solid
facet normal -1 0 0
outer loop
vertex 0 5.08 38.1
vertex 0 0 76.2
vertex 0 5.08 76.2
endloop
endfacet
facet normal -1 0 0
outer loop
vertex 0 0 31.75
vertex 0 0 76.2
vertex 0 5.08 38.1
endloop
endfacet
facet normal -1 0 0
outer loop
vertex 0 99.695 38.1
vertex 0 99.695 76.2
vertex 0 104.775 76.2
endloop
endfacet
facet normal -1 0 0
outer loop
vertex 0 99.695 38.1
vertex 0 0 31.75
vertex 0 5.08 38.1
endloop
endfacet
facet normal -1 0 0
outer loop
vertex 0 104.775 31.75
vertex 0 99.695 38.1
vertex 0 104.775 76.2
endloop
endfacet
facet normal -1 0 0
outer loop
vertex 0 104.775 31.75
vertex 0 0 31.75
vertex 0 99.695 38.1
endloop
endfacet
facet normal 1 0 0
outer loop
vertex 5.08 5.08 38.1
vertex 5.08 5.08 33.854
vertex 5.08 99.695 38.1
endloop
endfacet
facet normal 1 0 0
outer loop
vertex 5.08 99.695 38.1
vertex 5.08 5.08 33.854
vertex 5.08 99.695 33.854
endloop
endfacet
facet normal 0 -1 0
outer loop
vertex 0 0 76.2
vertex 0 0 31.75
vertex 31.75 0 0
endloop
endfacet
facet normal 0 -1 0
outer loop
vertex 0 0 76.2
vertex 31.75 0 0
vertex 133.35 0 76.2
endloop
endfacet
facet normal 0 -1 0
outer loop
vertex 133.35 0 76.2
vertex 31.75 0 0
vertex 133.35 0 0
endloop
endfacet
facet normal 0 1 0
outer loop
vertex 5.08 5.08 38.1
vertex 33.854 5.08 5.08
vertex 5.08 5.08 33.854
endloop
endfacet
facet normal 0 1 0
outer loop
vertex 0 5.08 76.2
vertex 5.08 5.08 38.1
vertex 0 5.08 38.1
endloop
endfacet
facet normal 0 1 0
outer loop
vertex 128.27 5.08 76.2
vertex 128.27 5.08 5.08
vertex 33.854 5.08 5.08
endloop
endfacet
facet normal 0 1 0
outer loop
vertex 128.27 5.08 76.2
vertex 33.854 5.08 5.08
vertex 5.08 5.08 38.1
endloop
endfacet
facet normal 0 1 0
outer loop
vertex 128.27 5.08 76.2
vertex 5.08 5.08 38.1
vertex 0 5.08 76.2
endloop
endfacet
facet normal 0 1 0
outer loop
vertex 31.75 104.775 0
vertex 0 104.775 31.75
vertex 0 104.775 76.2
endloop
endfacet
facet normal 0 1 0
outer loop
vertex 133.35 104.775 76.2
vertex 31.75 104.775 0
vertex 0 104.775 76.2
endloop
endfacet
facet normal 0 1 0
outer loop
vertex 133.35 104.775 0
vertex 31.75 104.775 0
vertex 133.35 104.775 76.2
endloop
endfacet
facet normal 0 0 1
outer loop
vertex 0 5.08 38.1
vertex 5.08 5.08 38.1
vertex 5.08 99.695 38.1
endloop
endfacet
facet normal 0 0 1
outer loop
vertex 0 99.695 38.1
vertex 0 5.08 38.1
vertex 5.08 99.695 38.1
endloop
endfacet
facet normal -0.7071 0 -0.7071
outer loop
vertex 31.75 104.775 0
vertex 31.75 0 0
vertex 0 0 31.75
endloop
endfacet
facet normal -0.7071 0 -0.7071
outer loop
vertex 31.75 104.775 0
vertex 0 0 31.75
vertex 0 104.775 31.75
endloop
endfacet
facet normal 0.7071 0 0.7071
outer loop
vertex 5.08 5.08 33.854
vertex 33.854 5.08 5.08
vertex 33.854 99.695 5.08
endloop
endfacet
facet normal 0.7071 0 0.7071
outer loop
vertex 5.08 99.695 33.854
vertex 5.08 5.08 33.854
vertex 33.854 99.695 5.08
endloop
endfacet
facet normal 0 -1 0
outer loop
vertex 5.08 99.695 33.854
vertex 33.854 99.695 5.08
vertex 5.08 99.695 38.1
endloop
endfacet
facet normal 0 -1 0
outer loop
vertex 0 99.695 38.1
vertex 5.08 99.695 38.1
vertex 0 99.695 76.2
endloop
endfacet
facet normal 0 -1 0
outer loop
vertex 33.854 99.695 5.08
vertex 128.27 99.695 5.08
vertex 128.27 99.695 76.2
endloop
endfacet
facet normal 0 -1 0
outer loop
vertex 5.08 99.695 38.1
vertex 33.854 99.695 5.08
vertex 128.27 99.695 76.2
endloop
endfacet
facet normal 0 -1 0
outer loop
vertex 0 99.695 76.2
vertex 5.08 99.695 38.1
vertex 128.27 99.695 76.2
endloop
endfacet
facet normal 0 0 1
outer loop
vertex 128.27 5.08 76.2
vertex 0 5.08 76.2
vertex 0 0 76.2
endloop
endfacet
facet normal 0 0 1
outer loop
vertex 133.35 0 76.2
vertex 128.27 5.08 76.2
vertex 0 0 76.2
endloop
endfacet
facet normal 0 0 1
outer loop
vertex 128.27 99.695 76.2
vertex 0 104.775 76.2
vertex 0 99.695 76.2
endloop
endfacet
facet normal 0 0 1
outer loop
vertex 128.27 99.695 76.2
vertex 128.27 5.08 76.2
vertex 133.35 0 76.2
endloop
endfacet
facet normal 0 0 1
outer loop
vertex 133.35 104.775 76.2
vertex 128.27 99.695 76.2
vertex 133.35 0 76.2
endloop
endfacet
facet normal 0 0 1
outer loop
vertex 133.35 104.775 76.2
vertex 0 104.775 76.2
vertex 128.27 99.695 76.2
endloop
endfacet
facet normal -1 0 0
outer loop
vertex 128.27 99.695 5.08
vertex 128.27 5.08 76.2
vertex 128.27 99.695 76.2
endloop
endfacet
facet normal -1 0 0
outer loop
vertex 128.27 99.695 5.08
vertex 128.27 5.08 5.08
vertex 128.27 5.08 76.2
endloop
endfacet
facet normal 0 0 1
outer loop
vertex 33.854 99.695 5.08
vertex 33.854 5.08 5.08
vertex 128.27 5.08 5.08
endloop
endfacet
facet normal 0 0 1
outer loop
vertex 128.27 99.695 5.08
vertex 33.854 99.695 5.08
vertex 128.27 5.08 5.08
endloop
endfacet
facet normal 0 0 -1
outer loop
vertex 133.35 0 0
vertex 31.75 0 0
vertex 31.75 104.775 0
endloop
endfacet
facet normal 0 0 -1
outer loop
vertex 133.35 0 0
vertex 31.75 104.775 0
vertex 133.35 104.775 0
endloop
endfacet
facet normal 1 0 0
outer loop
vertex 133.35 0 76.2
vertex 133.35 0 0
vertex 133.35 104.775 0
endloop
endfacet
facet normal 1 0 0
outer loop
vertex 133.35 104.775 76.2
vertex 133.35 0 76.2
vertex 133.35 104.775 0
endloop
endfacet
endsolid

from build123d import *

# Parameters (mm, degrees)
F0_W     = 133.35
F0_H     = 104.775
F1_DEPTH = 76.2
F2_SIZE  = 31.75
F3_T     = -5.08
F4_W     = 94.615
F4_H     = 38.1
F5_DEPTH = 25.4


with BuildPart() as f1:
    # F0 (on Top) → F1 (new body)
    with BuildSketch(Plane.XY):
        with Locations((66.675, 52.3875)):
            Rectangle(F0_W, F0_H)
    extrude(amount=F1_DEPTH)

    # F2
    f2_edges = [f1.edges().sort_by_distance(p)[0] for p in [
        (0, 52.3875, 0),
    ]]
    chamfer(f2_edges, length=F2_SIZE)

    # F3
    f3_openings = [f1.faces().sort_by_distance(p)[0] for p in [
        (66.675, 52.3875, 76.2),
    ]]
    offset(amount=F3_T, openings=f3_openings)

    # F4 (on face) → F5 (cut)
    with BuildSketch(Plane.YZ.offset(5.08)):
        with Locations((52.3875, 57.15)):
            Rectangle(F4_W, F4_H)
    extrude(amount=-F5_DEPTH, mode=Mode.SUBTRACT)


solid = f1.part
